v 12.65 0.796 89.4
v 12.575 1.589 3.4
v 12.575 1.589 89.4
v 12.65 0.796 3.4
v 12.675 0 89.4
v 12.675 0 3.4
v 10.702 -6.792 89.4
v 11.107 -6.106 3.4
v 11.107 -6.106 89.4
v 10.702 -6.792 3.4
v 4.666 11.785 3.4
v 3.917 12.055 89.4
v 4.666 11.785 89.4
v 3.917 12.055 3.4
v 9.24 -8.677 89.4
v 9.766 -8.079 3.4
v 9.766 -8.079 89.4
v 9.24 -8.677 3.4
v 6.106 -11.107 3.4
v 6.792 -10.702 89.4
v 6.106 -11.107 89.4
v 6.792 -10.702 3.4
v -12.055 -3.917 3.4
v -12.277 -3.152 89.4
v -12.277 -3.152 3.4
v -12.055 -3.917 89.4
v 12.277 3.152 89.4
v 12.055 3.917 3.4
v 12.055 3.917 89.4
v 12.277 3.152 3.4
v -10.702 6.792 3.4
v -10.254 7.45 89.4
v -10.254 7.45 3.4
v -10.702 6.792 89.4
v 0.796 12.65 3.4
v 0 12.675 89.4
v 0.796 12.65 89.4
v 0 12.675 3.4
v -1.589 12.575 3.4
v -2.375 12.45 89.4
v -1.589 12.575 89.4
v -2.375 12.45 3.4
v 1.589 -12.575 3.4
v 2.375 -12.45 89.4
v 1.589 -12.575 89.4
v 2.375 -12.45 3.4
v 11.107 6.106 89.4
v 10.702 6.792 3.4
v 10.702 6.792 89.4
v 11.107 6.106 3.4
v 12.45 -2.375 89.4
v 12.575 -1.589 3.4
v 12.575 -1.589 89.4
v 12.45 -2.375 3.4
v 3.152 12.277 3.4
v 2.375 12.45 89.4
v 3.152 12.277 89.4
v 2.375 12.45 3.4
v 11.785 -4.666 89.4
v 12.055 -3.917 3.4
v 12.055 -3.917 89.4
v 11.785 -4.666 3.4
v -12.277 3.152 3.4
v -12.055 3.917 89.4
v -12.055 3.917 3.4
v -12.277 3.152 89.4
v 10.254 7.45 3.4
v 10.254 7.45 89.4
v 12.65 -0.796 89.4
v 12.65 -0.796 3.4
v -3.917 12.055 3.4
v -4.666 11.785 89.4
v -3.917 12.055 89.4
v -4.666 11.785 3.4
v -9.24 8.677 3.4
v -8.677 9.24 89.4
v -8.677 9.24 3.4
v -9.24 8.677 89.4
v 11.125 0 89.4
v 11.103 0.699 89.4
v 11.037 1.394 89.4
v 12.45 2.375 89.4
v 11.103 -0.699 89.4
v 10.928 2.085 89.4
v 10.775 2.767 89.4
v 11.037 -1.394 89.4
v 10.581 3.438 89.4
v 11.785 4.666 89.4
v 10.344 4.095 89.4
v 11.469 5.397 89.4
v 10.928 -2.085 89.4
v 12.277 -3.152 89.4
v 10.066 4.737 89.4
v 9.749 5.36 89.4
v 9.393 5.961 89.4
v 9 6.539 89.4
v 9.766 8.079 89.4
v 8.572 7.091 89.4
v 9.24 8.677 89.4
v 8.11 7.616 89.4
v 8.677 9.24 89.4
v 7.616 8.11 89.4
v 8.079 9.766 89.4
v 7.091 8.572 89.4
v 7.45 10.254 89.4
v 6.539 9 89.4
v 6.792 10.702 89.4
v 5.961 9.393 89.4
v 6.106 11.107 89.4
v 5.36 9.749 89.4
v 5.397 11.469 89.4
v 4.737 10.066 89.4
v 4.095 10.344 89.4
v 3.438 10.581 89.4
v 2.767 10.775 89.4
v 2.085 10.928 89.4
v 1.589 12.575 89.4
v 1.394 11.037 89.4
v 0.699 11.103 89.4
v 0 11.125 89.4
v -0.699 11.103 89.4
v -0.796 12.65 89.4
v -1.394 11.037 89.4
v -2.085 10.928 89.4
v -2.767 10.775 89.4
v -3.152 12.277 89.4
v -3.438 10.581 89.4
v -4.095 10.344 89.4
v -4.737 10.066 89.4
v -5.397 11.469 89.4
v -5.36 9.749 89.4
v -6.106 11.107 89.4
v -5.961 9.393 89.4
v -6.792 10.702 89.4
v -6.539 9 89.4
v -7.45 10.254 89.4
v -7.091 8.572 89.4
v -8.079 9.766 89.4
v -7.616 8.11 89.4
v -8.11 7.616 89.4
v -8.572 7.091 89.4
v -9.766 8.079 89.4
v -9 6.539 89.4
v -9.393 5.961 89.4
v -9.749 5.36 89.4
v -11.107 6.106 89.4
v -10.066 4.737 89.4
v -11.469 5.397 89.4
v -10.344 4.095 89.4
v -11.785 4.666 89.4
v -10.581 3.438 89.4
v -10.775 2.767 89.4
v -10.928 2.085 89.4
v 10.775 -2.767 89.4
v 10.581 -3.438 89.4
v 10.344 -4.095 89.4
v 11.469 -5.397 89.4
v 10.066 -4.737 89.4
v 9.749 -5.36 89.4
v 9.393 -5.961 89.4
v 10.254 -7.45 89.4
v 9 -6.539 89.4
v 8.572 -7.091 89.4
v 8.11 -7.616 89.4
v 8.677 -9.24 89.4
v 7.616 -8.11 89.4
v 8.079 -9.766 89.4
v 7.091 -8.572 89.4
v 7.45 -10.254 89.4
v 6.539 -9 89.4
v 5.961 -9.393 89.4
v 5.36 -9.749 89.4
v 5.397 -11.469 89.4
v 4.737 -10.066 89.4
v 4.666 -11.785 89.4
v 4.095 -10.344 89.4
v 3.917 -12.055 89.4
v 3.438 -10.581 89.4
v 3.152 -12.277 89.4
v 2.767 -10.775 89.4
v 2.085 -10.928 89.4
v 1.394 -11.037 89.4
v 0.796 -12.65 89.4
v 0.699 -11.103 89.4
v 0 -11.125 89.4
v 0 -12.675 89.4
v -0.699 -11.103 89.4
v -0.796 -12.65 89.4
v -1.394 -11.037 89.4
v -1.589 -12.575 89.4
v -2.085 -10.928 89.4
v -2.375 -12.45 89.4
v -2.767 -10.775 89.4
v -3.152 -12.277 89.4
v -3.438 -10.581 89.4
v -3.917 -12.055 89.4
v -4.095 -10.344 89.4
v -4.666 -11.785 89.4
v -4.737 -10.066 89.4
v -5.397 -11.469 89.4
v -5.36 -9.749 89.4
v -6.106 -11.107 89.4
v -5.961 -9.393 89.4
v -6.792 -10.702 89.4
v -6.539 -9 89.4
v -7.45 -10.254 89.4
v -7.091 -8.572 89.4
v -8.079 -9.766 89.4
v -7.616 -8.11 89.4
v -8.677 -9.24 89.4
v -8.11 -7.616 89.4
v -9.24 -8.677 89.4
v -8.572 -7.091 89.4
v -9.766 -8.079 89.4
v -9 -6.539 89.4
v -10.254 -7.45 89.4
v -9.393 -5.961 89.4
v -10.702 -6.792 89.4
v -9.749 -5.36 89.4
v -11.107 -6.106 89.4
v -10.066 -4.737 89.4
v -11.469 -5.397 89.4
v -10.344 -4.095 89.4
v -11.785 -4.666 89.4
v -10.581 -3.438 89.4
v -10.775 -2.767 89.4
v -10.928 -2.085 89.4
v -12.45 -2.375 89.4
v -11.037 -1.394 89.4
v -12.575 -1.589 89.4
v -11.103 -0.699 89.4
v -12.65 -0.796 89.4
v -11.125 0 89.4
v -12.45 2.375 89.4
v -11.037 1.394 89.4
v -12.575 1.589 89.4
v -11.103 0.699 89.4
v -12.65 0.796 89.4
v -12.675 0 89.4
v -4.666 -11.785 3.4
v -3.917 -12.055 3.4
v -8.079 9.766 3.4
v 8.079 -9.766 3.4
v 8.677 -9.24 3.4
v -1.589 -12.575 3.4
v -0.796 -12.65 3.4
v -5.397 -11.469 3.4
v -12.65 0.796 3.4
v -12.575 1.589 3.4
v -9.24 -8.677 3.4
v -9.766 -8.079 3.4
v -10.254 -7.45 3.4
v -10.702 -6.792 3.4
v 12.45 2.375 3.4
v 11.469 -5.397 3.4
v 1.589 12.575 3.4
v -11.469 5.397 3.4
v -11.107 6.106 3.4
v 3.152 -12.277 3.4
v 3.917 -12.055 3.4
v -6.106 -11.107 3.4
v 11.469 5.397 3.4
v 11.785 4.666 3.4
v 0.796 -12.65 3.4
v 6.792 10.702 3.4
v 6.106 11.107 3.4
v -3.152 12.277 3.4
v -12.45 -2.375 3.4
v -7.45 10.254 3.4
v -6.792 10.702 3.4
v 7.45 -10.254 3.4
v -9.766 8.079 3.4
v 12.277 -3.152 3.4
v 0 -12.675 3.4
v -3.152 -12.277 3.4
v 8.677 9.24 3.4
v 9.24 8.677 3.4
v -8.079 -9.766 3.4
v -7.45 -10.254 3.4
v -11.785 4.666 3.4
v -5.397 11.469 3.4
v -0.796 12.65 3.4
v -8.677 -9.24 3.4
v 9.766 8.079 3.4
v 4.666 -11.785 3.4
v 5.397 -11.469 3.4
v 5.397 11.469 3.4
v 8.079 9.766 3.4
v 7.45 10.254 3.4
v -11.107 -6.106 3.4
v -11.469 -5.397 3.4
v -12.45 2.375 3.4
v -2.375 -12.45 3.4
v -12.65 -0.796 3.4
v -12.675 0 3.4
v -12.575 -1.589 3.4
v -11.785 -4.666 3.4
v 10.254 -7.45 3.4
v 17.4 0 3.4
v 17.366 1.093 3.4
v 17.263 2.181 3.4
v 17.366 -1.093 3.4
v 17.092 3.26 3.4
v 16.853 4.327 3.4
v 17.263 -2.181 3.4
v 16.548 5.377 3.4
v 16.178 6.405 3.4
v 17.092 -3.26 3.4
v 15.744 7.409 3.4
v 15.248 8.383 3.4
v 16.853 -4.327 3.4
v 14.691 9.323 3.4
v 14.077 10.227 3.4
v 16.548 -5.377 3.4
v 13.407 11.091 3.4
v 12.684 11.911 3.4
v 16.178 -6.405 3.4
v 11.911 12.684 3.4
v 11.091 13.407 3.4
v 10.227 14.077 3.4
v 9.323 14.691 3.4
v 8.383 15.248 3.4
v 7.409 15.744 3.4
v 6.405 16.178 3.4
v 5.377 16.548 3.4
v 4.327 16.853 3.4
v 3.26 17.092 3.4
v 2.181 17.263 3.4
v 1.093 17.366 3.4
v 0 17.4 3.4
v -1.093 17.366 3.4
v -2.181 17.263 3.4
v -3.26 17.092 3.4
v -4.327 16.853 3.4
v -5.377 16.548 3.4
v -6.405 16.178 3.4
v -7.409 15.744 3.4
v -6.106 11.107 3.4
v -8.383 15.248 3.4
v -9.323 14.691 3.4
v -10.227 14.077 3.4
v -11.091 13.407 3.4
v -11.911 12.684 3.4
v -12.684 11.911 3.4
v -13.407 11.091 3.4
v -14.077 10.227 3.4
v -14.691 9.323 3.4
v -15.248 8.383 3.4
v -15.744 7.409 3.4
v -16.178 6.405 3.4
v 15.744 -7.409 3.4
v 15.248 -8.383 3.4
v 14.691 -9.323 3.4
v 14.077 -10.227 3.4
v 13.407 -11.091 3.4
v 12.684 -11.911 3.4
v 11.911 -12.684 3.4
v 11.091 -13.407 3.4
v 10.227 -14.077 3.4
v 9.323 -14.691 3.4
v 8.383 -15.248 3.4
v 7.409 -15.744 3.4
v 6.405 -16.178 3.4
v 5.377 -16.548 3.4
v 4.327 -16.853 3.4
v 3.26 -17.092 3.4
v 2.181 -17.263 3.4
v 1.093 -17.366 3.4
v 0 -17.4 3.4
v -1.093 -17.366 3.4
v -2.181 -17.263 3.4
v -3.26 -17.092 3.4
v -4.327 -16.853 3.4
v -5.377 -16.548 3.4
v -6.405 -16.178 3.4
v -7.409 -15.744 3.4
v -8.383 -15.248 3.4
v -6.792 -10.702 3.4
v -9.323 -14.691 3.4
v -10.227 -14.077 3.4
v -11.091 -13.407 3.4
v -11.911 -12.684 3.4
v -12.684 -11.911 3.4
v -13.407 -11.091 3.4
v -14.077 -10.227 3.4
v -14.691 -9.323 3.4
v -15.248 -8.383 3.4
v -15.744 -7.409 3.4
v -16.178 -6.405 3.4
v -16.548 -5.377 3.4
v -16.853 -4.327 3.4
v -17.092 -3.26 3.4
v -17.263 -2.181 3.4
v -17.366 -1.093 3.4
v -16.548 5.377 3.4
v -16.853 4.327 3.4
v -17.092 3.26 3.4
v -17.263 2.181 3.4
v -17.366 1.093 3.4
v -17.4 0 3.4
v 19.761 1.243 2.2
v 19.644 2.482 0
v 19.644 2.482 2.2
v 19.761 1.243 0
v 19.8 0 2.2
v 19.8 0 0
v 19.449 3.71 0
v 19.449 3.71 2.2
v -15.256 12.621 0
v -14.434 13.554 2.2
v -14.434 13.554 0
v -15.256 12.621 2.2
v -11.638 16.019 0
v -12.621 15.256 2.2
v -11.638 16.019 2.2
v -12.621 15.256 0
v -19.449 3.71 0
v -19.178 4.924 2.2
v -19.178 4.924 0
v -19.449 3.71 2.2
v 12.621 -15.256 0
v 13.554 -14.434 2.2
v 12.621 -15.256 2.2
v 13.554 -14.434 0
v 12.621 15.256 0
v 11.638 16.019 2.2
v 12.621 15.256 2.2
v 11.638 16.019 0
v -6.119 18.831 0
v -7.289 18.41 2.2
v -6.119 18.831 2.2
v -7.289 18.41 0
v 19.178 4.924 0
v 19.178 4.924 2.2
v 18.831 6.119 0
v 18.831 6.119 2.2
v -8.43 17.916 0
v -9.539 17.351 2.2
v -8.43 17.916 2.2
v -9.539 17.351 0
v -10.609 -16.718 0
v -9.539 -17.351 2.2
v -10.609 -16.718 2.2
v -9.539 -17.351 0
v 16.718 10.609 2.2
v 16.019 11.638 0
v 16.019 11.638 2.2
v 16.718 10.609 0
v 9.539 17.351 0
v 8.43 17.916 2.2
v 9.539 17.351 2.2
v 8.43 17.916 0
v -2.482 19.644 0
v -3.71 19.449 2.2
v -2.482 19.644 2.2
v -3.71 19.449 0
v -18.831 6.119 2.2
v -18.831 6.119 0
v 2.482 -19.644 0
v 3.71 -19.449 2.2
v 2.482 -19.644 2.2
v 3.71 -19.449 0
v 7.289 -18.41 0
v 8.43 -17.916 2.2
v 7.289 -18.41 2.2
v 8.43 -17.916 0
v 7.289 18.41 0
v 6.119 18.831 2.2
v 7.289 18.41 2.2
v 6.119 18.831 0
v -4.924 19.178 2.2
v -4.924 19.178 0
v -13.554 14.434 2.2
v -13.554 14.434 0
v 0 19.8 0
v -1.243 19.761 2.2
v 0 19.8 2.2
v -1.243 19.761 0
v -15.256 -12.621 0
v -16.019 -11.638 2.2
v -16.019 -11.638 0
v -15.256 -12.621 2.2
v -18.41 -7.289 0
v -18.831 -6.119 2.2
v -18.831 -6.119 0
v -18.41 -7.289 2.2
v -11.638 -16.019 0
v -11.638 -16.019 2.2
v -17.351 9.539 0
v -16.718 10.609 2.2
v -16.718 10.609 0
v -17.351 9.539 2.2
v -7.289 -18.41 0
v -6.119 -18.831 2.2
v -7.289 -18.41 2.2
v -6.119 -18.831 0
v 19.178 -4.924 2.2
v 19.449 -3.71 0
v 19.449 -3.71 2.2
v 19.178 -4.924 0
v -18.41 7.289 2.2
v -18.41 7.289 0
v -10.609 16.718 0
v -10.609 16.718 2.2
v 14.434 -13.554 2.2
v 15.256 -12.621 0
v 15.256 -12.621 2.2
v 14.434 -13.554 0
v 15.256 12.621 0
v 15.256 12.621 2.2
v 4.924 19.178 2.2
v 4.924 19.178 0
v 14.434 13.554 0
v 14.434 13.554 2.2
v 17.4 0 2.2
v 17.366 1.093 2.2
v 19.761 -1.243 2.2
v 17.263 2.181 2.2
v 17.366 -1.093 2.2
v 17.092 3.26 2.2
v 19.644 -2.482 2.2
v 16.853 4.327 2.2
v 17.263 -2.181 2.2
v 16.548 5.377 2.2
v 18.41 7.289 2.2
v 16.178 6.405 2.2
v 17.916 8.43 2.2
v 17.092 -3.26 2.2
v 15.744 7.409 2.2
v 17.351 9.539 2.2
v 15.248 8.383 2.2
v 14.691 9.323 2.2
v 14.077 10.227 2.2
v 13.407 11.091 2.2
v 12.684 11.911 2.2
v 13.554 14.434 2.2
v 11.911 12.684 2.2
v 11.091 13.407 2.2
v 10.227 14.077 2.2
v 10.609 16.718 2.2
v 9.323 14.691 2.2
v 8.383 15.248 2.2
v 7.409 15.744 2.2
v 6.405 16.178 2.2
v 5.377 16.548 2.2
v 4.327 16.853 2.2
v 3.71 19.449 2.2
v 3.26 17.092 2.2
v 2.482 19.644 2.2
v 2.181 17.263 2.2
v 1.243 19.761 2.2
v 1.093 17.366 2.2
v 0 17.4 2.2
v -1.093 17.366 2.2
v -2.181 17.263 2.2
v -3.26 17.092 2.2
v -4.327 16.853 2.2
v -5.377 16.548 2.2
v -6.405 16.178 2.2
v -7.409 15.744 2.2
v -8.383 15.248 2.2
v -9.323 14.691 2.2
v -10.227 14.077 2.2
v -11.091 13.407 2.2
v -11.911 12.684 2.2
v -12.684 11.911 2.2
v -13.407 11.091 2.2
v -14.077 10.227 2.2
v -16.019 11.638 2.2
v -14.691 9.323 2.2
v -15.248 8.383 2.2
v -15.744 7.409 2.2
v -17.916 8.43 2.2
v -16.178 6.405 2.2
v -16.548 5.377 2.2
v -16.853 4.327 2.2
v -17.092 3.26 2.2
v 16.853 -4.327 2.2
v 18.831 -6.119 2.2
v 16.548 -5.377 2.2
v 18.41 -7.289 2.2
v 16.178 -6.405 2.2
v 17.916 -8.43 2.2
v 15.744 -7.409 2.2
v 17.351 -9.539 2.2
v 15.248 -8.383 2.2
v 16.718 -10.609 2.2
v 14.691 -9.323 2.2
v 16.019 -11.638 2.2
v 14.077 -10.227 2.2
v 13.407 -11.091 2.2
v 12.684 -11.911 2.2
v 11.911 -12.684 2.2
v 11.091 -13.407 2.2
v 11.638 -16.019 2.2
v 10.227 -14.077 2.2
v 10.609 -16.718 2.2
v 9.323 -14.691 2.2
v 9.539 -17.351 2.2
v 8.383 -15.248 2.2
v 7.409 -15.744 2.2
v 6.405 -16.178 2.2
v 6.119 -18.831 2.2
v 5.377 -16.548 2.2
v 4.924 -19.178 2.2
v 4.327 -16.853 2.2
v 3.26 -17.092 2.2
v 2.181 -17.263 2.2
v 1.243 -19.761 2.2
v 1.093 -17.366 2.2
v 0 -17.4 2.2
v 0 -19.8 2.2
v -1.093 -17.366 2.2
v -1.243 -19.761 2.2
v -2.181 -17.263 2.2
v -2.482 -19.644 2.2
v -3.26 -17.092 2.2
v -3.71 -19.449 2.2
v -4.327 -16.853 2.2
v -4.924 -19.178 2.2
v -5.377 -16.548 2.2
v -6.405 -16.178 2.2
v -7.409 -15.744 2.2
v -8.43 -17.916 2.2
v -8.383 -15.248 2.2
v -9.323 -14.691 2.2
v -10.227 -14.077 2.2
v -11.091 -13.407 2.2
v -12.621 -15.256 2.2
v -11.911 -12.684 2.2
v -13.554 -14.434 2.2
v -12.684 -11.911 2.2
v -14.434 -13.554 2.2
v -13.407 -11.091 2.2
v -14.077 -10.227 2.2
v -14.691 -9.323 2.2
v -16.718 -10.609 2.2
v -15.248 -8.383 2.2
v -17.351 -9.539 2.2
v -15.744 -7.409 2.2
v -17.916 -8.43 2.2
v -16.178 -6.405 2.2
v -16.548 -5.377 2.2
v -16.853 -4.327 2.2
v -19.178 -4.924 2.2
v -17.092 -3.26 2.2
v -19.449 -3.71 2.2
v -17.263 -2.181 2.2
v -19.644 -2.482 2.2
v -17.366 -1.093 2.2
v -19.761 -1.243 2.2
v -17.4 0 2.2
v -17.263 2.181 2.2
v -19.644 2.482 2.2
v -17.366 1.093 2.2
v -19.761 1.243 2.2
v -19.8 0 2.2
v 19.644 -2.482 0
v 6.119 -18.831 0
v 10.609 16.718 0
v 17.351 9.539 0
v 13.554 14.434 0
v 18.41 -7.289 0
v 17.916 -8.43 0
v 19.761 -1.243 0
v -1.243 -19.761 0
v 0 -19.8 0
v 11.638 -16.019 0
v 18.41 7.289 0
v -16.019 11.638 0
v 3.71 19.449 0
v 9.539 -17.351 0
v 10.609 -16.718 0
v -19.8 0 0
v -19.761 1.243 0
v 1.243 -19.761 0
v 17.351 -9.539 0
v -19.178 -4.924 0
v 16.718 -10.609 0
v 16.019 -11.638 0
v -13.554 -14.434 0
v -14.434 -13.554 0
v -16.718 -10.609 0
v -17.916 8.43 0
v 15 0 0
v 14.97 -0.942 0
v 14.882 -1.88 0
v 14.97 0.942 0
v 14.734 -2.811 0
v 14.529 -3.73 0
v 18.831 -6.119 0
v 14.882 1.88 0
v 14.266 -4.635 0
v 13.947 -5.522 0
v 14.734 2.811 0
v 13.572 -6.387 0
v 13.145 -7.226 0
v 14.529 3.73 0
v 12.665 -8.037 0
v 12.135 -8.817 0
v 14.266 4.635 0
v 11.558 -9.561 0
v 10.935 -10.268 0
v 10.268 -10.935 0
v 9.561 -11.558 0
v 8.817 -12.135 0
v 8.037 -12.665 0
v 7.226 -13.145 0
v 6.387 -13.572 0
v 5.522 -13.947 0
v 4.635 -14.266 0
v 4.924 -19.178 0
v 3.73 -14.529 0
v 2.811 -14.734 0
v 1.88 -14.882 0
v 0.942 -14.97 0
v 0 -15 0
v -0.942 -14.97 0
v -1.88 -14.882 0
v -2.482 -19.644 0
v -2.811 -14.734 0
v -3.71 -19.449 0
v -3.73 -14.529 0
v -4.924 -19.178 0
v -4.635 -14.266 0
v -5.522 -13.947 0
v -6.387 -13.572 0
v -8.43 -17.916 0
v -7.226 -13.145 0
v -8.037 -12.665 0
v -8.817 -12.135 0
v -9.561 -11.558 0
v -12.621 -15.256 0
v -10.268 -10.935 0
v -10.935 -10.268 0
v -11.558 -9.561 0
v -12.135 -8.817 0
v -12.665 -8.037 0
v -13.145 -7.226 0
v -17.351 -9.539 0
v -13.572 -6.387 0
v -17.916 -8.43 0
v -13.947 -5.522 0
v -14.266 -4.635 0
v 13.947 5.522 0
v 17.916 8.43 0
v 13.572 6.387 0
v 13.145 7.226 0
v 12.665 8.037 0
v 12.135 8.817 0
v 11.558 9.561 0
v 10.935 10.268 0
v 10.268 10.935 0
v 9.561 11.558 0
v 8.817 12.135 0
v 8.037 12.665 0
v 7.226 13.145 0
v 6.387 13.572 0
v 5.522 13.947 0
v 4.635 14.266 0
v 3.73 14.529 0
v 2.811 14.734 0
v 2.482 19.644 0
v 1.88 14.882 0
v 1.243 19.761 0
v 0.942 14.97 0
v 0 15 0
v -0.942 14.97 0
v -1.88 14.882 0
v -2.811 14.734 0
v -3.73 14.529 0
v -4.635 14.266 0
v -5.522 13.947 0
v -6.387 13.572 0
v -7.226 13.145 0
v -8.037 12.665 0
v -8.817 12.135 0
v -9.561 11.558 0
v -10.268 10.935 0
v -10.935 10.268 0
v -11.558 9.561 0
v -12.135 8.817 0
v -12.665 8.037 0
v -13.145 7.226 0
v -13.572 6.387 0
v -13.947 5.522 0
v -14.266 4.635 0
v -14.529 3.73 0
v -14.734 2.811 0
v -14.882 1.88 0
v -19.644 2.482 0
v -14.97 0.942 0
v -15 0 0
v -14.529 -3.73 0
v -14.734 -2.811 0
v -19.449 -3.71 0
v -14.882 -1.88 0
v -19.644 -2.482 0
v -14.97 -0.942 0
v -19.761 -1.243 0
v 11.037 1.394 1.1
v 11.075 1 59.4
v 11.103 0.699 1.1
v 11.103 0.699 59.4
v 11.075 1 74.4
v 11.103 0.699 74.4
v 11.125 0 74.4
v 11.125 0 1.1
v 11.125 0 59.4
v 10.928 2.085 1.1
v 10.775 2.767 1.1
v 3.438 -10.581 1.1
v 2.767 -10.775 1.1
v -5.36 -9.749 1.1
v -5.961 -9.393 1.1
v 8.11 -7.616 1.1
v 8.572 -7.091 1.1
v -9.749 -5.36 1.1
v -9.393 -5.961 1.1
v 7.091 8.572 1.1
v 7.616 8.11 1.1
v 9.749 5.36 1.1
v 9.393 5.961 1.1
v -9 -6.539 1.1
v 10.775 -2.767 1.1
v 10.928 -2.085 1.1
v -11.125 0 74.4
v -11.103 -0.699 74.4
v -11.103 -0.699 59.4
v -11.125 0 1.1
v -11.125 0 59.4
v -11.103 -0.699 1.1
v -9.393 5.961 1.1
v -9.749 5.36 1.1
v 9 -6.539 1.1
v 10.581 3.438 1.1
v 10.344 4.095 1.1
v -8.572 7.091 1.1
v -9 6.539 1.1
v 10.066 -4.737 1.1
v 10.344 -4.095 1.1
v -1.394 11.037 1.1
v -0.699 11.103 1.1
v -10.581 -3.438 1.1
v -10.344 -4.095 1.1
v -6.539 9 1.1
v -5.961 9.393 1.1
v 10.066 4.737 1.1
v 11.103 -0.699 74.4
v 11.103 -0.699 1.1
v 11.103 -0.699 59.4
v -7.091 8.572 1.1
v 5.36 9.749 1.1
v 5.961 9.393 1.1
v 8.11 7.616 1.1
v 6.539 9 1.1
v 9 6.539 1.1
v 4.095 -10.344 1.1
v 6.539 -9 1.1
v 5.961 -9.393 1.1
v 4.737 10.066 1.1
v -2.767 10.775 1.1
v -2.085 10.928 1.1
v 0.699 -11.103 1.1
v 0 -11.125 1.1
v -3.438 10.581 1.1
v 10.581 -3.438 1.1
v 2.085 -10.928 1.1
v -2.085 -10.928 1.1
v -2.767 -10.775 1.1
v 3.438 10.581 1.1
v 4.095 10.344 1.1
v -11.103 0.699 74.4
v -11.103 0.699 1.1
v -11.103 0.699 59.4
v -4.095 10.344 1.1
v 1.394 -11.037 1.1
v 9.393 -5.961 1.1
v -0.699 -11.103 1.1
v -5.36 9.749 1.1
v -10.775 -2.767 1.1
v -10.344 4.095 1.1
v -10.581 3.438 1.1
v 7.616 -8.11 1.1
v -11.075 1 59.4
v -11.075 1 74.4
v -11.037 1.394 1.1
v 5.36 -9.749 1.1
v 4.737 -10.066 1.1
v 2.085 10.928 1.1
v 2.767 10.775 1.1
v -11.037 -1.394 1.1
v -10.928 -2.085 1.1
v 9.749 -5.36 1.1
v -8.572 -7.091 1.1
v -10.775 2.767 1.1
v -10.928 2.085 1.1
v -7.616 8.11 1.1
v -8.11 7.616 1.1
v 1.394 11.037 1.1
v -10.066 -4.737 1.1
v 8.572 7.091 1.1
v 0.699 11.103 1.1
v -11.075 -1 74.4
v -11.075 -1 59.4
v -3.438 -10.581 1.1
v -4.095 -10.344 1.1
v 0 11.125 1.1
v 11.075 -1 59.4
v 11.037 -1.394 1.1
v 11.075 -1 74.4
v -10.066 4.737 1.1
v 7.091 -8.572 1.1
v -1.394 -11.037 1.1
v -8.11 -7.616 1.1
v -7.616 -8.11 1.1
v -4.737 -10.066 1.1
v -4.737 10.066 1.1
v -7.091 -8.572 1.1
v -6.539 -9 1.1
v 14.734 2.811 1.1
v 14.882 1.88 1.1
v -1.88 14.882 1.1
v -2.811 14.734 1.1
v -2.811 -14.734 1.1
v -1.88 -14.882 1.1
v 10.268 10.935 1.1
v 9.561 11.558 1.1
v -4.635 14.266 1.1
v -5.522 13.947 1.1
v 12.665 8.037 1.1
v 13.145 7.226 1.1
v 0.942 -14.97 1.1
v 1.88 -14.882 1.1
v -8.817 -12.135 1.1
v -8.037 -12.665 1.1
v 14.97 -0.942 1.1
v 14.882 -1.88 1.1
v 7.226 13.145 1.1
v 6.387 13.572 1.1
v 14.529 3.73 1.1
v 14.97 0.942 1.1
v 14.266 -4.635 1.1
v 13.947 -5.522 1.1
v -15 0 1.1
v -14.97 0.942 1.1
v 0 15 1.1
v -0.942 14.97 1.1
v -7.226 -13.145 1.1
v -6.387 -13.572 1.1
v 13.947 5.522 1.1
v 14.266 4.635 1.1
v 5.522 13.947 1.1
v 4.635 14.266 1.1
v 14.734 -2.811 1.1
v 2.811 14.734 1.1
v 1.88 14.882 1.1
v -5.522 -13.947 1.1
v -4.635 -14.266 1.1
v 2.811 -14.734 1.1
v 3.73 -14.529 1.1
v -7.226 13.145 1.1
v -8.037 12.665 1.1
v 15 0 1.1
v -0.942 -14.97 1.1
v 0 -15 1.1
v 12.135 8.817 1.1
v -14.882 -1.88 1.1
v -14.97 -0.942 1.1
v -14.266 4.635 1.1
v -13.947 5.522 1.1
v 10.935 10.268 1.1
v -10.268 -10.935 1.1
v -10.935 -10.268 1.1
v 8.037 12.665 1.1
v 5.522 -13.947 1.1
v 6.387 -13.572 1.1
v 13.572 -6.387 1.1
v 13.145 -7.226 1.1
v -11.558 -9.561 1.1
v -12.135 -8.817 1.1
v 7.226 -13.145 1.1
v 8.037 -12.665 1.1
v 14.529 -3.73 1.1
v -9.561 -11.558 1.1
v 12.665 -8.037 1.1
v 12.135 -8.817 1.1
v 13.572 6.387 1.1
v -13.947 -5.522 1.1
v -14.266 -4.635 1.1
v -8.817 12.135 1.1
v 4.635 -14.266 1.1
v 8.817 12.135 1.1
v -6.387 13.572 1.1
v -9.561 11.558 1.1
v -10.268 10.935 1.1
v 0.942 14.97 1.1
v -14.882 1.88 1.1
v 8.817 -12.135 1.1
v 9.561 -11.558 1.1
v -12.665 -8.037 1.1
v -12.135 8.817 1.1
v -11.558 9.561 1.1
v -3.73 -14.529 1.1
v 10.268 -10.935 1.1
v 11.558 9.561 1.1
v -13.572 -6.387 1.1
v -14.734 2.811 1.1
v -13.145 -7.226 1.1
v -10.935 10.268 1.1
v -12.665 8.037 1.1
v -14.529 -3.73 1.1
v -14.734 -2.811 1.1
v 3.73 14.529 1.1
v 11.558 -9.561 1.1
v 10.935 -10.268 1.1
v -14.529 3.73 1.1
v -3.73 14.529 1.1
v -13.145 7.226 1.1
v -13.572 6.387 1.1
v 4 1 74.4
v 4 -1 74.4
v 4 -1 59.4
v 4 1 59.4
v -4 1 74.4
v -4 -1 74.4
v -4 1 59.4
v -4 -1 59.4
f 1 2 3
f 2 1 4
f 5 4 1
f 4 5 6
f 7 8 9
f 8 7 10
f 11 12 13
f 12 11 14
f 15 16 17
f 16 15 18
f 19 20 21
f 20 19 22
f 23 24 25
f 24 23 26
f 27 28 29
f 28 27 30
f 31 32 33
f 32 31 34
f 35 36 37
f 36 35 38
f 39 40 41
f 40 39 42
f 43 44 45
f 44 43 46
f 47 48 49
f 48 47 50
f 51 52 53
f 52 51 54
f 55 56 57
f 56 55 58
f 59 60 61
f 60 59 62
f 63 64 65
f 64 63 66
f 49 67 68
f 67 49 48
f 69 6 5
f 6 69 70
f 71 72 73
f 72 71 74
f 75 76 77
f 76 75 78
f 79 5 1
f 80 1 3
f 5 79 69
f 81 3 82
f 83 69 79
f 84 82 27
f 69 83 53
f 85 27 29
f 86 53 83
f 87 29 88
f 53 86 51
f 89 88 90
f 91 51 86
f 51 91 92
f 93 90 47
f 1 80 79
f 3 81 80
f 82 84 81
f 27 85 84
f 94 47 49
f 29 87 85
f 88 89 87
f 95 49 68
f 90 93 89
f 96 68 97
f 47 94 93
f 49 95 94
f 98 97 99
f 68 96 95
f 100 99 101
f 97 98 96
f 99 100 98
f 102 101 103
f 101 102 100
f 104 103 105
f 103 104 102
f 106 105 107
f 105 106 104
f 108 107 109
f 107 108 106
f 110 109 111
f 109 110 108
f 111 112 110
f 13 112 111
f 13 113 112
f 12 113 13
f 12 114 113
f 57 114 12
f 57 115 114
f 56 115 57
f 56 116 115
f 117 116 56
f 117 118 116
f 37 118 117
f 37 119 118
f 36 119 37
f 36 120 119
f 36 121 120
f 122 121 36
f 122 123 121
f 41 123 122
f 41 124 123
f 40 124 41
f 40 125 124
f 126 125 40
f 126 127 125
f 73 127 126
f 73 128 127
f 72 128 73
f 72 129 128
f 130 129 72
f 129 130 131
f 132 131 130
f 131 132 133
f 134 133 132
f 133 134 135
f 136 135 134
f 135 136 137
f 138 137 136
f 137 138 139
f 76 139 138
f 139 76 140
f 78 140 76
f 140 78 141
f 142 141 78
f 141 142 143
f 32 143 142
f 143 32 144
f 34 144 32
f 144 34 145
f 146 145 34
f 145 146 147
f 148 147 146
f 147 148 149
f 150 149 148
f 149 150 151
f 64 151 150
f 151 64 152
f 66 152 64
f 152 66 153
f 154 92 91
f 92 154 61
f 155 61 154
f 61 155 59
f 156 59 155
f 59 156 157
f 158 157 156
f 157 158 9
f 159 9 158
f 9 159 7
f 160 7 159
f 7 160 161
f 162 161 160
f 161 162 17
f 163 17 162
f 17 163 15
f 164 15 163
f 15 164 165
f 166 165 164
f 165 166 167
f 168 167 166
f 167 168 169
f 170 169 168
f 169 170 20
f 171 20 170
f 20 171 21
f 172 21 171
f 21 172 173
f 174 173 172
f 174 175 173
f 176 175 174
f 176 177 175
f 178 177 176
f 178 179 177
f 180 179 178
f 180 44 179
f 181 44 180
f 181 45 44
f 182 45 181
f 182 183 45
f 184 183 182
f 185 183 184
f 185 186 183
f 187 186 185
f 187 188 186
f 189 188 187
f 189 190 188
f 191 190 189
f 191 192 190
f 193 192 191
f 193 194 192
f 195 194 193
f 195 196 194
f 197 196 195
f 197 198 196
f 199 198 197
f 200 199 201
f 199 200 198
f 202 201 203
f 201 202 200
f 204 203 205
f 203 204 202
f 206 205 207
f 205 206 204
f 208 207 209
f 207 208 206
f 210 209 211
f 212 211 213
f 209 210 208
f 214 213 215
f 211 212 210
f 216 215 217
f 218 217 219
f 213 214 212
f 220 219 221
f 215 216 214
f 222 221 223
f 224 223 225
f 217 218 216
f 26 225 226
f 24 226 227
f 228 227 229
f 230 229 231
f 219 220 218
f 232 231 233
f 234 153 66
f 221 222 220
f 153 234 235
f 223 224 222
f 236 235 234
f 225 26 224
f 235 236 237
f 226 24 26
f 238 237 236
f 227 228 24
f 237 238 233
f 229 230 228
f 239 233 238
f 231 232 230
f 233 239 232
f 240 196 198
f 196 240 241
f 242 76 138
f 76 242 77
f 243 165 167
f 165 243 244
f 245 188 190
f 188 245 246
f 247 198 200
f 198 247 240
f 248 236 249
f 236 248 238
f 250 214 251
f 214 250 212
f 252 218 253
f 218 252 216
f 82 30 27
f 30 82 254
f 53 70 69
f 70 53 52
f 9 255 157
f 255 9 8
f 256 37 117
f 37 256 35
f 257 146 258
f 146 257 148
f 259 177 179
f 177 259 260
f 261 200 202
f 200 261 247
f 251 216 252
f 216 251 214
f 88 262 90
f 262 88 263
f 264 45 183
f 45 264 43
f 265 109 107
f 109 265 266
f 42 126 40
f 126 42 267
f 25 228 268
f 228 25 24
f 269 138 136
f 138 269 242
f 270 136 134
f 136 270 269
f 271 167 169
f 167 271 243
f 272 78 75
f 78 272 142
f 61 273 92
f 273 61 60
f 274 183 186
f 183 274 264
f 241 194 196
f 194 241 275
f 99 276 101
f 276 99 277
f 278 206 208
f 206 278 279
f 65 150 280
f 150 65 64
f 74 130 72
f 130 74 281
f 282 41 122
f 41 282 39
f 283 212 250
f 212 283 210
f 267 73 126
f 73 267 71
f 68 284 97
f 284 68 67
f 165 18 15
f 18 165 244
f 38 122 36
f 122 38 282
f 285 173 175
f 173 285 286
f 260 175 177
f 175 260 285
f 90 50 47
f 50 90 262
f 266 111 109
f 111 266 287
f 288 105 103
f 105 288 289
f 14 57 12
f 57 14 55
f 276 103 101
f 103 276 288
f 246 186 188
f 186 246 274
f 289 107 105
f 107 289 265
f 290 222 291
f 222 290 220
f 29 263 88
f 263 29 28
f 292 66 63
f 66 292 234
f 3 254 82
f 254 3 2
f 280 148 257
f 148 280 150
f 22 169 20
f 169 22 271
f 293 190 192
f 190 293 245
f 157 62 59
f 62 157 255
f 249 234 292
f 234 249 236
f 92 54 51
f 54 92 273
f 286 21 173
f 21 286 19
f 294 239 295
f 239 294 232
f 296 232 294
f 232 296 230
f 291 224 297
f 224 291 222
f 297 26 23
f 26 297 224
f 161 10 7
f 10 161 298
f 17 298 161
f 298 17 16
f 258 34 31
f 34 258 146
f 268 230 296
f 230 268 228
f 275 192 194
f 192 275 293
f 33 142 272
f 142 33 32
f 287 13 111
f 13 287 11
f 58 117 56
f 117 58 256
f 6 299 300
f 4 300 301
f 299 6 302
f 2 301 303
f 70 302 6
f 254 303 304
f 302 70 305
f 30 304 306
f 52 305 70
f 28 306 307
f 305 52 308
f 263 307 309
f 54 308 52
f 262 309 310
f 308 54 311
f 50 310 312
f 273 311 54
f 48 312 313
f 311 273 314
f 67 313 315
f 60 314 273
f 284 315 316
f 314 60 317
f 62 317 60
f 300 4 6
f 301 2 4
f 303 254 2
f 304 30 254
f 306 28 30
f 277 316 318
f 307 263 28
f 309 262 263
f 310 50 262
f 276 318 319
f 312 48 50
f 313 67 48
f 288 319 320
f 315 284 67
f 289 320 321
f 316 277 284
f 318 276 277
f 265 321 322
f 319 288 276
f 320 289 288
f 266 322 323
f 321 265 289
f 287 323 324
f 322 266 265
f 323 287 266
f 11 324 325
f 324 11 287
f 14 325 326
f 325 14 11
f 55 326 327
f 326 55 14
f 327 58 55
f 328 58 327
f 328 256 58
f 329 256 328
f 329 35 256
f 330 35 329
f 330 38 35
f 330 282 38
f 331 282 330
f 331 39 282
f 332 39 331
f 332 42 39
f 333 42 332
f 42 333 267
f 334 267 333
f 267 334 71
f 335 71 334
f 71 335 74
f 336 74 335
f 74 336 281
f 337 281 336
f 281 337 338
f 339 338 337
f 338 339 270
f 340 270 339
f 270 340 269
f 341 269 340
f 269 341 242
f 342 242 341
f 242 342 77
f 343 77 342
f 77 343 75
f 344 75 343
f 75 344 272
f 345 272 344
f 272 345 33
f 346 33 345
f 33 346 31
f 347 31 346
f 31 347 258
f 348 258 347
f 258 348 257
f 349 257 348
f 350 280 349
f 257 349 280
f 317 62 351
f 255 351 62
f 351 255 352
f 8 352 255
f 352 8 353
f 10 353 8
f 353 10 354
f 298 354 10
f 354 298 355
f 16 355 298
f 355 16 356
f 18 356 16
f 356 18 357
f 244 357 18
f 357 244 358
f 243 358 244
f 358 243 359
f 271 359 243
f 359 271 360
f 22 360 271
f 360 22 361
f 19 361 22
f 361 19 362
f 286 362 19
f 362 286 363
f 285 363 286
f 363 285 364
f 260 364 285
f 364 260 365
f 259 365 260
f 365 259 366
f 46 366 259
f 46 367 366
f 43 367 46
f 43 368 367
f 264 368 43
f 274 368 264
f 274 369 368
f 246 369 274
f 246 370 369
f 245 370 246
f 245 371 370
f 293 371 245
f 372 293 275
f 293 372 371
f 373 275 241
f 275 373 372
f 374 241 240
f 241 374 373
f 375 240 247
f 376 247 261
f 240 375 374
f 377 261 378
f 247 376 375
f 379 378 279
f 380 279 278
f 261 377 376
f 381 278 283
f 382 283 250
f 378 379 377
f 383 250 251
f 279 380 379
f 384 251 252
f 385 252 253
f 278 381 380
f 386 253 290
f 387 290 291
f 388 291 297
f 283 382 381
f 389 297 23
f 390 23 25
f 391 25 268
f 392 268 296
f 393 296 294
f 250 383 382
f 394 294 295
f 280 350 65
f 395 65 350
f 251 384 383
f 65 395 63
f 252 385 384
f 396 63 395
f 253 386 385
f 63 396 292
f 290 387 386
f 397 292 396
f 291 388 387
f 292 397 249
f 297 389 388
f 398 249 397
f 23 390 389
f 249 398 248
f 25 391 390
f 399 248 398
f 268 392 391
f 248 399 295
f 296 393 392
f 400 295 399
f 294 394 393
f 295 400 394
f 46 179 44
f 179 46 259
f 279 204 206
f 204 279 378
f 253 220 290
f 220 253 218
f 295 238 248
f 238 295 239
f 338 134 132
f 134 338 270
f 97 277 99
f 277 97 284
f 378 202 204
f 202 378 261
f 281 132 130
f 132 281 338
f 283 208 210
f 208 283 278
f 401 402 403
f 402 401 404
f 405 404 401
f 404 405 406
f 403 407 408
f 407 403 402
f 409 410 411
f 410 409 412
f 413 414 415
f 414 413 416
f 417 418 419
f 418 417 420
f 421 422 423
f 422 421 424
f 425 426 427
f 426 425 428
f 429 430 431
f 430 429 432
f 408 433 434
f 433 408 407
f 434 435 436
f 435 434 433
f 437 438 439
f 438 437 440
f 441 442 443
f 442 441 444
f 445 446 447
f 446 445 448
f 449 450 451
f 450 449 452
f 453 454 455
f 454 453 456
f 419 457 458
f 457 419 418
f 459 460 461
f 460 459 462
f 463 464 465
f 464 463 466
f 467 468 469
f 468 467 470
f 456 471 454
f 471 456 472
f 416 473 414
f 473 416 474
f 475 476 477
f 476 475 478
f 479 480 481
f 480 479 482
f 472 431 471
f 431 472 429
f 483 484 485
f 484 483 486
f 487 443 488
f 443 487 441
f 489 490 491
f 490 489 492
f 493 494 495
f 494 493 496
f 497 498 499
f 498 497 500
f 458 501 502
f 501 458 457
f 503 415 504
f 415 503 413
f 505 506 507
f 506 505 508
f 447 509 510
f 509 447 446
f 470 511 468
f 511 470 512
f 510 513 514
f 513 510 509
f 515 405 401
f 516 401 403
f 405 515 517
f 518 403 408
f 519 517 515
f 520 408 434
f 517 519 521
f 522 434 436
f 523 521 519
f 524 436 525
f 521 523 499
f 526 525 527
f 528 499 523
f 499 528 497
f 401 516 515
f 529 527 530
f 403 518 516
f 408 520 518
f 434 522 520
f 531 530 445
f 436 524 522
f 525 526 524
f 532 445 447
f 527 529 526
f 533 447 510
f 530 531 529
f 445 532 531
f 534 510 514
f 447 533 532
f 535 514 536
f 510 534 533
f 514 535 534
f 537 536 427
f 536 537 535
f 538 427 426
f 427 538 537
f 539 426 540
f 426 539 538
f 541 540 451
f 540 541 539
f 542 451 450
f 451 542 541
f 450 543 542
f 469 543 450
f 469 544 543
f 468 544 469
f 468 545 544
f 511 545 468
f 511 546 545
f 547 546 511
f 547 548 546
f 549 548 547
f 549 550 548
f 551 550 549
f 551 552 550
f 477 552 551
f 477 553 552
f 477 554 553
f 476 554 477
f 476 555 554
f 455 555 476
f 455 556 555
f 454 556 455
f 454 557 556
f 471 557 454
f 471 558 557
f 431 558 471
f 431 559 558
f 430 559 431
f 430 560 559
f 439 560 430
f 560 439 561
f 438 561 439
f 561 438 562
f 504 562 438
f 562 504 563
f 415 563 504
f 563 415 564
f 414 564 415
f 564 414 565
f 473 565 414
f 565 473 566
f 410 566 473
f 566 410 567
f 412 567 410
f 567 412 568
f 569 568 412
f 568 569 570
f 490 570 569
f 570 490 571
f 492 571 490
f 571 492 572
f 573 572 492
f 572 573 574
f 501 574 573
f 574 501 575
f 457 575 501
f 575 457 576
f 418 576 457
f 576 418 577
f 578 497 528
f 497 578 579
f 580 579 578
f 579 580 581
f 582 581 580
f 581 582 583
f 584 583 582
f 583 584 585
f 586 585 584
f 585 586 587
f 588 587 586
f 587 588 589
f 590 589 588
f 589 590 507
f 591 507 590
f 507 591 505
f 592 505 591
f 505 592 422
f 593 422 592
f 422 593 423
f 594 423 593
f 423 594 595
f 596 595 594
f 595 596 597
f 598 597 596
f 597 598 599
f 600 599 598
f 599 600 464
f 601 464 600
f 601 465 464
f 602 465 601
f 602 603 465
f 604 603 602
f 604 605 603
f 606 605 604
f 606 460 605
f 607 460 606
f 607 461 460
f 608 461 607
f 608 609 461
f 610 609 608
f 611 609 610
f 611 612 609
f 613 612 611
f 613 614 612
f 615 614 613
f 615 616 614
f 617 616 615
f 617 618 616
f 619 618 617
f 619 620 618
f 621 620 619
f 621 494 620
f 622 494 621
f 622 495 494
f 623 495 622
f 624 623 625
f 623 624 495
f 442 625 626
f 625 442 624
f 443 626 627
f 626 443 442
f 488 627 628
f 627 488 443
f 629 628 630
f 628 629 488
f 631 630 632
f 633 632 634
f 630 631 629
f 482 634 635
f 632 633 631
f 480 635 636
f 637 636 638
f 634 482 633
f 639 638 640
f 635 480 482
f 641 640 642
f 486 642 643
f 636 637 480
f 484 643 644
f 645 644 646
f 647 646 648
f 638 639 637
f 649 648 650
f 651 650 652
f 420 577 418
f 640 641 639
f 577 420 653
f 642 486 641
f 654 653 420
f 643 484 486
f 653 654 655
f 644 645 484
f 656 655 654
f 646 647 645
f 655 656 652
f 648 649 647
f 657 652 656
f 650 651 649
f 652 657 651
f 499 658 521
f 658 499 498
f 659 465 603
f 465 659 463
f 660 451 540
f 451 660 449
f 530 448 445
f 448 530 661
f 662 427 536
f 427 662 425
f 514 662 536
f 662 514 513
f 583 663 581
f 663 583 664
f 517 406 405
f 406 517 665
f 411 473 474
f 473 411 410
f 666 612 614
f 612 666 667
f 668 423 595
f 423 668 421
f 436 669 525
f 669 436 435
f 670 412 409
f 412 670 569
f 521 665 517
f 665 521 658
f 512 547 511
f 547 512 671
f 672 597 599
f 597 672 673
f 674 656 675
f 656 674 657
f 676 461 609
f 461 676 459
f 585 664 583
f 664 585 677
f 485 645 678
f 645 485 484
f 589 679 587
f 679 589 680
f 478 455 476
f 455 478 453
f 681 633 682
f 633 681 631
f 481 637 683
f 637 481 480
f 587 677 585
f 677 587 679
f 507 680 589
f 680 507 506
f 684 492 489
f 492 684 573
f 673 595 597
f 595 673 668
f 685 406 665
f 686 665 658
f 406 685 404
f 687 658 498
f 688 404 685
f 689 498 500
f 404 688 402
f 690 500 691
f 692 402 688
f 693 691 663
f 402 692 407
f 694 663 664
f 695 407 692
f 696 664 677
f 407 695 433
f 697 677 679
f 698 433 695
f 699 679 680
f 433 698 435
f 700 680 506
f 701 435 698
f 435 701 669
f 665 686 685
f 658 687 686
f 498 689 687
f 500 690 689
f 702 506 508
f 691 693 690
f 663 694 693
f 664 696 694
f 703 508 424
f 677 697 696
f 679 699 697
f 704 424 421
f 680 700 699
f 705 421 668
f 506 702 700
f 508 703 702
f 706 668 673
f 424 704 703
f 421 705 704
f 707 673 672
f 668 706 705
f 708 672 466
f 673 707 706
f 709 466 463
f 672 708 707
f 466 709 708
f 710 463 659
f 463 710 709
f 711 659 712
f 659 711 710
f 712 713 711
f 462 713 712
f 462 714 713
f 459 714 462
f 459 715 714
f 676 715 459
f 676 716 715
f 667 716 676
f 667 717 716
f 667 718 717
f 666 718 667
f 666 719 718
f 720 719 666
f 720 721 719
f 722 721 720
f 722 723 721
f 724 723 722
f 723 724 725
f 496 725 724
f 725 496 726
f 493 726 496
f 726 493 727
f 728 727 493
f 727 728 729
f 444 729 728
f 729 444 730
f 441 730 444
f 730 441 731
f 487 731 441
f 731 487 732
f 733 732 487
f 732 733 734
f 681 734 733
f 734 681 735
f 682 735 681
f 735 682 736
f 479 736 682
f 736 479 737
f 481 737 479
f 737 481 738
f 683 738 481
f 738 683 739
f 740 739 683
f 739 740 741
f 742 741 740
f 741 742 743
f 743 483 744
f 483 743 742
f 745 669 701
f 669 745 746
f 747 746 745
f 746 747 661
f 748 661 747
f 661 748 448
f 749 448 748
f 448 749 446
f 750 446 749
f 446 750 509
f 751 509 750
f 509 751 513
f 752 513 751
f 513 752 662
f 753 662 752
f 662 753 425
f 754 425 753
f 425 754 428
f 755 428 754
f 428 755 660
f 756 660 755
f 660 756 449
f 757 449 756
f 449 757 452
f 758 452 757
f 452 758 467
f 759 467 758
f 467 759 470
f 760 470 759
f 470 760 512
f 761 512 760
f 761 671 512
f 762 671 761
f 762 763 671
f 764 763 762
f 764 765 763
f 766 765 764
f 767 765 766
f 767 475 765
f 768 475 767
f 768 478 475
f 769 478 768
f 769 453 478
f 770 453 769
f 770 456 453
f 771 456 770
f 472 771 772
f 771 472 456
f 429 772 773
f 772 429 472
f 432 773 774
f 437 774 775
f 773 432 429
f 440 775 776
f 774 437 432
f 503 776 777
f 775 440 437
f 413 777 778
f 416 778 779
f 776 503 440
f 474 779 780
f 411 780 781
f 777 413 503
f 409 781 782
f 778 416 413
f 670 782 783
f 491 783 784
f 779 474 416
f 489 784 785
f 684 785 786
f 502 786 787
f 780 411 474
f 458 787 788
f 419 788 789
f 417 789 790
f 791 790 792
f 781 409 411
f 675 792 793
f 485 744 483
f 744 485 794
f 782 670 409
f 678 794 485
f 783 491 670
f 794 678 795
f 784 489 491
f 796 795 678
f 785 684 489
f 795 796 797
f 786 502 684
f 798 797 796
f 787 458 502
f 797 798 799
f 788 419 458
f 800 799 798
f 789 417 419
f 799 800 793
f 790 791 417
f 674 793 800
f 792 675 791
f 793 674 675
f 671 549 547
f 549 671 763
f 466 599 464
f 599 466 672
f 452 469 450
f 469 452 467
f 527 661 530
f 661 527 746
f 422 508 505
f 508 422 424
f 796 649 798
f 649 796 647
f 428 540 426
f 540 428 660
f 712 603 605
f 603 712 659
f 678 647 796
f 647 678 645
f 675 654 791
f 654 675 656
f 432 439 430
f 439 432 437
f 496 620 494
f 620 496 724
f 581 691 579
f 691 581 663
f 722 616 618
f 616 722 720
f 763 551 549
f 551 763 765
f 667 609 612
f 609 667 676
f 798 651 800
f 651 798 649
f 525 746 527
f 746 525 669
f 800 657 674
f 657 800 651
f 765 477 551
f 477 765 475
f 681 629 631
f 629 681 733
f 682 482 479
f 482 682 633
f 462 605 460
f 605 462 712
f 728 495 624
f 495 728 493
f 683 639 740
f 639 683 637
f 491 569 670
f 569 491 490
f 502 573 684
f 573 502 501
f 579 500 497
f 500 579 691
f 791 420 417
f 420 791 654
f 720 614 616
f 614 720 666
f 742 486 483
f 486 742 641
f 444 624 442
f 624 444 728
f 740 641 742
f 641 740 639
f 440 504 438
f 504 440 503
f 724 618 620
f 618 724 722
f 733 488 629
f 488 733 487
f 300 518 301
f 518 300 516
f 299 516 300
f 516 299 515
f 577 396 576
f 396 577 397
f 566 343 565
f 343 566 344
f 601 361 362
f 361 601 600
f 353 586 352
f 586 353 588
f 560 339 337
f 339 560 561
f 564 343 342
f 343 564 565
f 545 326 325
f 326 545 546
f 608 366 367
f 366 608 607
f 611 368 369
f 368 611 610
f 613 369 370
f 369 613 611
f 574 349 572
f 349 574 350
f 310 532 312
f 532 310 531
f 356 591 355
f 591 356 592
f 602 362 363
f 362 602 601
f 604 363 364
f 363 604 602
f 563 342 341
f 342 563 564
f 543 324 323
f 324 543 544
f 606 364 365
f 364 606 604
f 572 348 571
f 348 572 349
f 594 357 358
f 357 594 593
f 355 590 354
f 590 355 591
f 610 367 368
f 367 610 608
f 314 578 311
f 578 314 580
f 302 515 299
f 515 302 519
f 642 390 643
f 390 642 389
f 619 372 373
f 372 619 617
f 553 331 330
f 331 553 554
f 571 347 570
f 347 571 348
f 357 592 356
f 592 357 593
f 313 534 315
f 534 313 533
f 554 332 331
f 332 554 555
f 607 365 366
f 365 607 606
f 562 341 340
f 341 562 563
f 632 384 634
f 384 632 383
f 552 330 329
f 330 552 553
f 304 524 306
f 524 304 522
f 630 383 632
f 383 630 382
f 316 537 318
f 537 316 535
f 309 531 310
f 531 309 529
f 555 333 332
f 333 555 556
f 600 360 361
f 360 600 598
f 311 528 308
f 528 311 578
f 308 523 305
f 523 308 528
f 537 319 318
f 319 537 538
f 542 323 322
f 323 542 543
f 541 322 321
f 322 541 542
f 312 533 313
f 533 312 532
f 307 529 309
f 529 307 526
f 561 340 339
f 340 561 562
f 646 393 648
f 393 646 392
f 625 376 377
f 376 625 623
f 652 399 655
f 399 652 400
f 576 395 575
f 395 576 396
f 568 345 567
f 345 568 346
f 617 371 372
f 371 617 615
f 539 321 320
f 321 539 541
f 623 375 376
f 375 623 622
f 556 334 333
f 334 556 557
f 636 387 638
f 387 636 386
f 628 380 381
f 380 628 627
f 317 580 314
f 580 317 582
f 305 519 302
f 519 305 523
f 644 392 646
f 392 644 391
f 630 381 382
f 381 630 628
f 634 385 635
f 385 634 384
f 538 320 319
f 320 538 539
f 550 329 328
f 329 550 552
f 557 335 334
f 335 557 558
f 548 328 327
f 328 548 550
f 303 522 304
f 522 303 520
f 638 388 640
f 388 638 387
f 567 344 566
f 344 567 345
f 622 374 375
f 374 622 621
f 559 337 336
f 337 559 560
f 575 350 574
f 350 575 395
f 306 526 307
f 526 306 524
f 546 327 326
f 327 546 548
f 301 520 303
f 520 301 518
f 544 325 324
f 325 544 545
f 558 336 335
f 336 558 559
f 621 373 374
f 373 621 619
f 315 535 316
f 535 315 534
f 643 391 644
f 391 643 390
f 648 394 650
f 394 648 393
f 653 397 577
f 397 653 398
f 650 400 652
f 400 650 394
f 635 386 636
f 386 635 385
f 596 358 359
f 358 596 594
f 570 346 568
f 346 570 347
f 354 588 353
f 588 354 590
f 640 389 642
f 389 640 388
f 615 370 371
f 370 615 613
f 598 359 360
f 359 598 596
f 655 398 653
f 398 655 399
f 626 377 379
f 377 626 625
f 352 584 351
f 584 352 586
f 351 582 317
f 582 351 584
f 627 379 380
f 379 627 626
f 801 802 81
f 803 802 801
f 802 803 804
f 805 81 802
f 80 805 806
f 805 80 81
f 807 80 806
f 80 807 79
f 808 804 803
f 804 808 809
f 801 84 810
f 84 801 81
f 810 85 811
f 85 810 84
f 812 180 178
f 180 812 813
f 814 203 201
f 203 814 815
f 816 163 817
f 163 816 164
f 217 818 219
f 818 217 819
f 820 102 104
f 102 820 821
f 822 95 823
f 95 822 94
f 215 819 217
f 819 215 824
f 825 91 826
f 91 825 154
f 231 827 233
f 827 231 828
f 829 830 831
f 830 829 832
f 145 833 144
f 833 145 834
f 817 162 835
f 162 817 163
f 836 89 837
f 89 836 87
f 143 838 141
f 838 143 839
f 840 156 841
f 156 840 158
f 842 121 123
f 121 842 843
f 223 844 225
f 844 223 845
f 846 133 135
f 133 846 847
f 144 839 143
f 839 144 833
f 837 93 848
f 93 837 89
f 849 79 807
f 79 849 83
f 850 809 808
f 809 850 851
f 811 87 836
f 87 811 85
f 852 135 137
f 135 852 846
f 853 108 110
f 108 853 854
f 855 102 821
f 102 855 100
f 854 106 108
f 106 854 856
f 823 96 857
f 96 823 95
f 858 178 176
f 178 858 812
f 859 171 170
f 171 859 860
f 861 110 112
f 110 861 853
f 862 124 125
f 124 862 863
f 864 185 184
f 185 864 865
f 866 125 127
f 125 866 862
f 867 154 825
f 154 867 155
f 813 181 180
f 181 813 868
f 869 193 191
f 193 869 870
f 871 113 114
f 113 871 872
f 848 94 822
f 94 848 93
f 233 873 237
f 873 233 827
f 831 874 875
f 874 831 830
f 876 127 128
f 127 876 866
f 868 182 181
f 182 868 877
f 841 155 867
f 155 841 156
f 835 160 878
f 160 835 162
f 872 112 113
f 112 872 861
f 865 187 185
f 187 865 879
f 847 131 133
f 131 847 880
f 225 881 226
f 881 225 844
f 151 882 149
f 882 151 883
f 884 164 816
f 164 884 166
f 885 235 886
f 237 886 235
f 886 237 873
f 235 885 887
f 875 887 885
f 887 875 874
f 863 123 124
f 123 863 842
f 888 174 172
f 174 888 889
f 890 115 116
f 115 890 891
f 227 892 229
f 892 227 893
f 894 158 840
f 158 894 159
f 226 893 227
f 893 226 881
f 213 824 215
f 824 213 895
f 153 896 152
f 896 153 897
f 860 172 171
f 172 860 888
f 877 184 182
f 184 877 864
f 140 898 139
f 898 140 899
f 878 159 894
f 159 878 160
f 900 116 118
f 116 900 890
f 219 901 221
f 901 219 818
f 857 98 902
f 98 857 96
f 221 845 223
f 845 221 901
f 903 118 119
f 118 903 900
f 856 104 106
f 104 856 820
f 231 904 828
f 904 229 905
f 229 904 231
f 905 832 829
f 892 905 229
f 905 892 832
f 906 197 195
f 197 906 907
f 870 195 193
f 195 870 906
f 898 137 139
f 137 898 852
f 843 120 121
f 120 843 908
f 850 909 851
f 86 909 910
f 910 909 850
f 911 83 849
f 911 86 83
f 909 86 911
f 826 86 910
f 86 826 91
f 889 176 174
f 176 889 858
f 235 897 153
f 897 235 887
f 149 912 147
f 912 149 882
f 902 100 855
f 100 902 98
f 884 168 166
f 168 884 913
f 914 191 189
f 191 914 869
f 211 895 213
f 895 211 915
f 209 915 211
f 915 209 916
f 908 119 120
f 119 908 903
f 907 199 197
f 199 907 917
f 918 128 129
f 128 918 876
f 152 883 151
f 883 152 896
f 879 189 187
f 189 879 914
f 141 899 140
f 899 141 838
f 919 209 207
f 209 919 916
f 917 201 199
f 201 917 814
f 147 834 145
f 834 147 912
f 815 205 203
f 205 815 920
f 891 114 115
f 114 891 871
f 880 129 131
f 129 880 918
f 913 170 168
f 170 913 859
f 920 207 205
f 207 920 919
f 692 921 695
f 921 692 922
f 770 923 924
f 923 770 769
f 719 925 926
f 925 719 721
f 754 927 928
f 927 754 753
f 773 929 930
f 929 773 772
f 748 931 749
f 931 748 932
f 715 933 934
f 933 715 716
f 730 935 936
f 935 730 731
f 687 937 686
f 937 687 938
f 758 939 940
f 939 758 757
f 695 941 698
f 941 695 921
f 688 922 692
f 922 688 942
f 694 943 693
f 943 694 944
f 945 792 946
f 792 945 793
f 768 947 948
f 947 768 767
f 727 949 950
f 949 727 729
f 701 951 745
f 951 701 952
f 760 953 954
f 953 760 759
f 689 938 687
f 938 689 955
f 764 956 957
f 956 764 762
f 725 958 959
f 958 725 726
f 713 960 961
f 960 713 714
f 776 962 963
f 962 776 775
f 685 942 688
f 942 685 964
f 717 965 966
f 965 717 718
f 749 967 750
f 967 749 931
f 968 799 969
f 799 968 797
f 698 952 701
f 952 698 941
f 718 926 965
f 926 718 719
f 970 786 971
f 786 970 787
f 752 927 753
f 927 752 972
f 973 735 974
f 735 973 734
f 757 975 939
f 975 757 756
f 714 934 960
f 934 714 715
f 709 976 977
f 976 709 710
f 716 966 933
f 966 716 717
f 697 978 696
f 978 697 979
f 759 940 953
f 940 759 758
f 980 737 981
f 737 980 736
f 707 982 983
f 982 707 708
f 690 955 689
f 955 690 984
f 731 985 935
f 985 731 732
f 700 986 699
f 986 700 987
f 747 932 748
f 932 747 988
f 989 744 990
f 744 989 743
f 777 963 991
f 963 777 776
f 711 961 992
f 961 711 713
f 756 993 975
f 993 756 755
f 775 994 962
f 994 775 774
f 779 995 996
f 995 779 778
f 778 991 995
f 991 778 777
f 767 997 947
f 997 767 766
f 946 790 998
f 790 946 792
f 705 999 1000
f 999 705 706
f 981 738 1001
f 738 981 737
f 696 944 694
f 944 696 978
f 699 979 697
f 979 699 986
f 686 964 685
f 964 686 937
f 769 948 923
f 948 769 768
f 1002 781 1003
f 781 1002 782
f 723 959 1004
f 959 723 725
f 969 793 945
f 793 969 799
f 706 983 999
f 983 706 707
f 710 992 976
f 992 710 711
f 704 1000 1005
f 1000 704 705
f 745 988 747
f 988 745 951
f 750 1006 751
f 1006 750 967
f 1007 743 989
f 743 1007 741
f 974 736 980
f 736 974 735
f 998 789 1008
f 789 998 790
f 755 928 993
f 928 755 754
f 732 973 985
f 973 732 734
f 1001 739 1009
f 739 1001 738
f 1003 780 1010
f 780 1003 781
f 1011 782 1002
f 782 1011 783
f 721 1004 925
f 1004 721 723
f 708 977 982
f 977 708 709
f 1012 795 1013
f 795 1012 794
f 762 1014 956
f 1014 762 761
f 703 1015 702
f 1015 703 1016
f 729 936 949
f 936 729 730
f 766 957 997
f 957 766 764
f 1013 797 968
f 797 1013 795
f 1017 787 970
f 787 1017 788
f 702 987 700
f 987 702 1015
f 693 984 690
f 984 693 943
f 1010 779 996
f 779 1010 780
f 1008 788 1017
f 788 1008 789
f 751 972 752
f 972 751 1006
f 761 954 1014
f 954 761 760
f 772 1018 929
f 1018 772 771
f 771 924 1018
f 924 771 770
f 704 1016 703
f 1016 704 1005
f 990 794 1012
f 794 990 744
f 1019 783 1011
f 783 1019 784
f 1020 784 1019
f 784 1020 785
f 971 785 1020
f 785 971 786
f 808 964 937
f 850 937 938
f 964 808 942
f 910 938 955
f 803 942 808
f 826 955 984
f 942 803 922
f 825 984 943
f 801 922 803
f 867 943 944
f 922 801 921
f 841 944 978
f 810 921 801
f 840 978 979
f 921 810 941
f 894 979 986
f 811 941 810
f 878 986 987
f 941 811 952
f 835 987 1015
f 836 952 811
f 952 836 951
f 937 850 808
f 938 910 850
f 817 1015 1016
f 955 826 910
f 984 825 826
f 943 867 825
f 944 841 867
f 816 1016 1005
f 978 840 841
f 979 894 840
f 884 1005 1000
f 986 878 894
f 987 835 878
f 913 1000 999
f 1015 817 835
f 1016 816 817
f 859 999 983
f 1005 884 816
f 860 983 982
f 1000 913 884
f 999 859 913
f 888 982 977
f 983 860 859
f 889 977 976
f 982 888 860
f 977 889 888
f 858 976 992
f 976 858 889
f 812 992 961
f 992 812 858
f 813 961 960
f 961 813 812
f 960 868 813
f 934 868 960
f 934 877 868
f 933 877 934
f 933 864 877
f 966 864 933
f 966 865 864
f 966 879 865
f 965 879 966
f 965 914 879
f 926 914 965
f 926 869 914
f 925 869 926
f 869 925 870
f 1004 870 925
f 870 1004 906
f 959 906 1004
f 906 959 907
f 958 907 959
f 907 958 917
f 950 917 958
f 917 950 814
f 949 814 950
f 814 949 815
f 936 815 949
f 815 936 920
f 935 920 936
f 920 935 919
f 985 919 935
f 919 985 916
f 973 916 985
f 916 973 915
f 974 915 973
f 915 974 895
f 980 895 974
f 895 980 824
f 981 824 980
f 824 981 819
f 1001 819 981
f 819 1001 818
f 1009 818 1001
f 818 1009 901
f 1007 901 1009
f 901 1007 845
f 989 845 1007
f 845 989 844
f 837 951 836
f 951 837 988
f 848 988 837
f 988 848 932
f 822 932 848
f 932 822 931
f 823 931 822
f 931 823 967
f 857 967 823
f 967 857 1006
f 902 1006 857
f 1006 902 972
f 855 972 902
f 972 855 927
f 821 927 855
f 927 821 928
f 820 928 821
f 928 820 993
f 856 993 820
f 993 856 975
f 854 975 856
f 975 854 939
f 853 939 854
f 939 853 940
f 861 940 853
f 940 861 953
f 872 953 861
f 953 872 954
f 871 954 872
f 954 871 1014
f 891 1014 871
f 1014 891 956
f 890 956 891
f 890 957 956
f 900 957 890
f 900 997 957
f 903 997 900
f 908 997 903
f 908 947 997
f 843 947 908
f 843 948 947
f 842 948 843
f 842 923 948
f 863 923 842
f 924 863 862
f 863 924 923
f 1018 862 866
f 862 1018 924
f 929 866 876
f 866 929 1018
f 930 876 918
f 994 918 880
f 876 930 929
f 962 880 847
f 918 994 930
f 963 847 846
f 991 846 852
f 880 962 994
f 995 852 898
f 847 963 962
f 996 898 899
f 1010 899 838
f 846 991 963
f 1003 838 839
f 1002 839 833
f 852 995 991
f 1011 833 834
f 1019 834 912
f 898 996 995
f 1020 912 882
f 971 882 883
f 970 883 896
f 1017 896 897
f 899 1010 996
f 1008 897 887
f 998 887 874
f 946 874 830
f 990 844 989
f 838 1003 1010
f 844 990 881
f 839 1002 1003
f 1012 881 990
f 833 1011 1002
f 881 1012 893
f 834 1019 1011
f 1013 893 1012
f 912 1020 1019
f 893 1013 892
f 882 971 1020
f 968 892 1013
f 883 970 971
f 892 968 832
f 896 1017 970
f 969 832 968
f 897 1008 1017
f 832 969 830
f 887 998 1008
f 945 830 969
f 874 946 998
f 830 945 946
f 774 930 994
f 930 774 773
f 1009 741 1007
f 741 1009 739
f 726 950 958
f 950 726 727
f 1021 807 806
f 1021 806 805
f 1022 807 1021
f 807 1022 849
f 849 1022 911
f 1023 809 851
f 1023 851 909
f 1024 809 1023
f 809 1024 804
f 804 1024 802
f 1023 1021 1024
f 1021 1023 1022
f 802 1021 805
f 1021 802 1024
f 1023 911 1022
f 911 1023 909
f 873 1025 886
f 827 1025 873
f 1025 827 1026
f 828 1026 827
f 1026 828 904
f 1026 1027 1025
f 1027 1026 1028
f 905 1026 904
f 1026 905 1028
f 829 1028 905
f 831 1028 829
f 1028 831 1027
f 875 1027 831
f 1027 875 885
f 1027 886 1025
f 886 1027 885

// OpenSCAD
/* Setup parameters */
// The number of 35mm reels to fit in the tube. Rule of thumb: 1 medium format reel = ~1.5 35mm reels (round up to 2).
Number_Of_Reels = 2;

/* [Hidden] */
$fn = 100;

THIRTYFIVEMM_REEL_HEIGHT = 42;
TUBE_LENGTH = 43 * Number_Of_Reels;
TUBE_THICKNESS = 1.55;
TUBE_OUTER_DIAMETER = 25.35;
TUBE_INNER_DIAMETER = TUBE_OUTER_DIAMETER - TUBE_THICKNESS * 2;
BASE_HEIGHT_LOWER = 2.2;
BASE_HEIGHT_HIGHER = 3.4 - BASE_HEIGHT_LOWER;
BASE_LOWER_DIAMETER = 39.6;
BASE_HIGHER_DIAMETER = 34.8;
INNER_BOTTOM_CUTOUT_DIAMETER = 30;
ROTARY_STICK_HOLDER_LENGTH = (TUBE_INNER_DIAMETER - 8) / 2;
ROTARY_STICK_HOLDER_WIDTH = 2;
ROTARY_STICK_HOLDER_HEIGHT = 15;

module tube(length, outer_diameter, inner_diameter, thickness) {
    total_base_height = BASE_HEIGHT_LOWER + BASE_HEIGHT_HIGHER;

    union() {
        difference() {
            union() {
                // Main tube positioned so it starts at top of bases
                translate([0, 0, total_base_height + length / 2]) cylinder(h=length, d=outer_diameter, center=true, $fn=100);
                // Lower base at z=0
                cylinder(h=BASE_HEIGHT_LOWER, d=BASE_LOWER_DIAMETER, $fn=100);
                // Higher base on top of lower base
                translate([0, 0, BASE_HEIGHT_LOWER]) cylinder(h=BASE_HEIGHT_HIGHER, d=BASE_HIGHER_DIAMETER, $fn=100);
            }
            // Inner cutout for entire tube length plus bases
            cylinder(h=total_base_height + length, d=inner_diameter, $fn=100);
            // Bottom cutout
            cylinder(h=BASE_HEIGHT_LOWER / 2, d=INNER_BOTTOM_CUTOUT_DIAMETER, $fn=100);
        }

        // Rotary stick holders - two opposite each other inside the tube near the top
        for (angle = [0, 180]) {
            rotate([0, 0, angle])
                translate([inner_diameter / 2 - ROTARY_STICK_HOLDER_LENGTH, -ROTARY_STICK_HOLDER_WIDTH / 2, total_base_height + length - 15 - ROTARY_STICK_HOLDER_HEIGHT])
                    cube([ROTARY_STICK_HOLDER_LENGTH, ROTARY_STICK_HOLDER_WIDTH, ROTARY_STICK_HOLDER_HEIGHT]);
        }
    }
}

tube(TUBE_LENGTH, TUBE_OUTER_DIAMETER, TUBE_INNER_DIAMETER, TUBE_THICKNESS);
